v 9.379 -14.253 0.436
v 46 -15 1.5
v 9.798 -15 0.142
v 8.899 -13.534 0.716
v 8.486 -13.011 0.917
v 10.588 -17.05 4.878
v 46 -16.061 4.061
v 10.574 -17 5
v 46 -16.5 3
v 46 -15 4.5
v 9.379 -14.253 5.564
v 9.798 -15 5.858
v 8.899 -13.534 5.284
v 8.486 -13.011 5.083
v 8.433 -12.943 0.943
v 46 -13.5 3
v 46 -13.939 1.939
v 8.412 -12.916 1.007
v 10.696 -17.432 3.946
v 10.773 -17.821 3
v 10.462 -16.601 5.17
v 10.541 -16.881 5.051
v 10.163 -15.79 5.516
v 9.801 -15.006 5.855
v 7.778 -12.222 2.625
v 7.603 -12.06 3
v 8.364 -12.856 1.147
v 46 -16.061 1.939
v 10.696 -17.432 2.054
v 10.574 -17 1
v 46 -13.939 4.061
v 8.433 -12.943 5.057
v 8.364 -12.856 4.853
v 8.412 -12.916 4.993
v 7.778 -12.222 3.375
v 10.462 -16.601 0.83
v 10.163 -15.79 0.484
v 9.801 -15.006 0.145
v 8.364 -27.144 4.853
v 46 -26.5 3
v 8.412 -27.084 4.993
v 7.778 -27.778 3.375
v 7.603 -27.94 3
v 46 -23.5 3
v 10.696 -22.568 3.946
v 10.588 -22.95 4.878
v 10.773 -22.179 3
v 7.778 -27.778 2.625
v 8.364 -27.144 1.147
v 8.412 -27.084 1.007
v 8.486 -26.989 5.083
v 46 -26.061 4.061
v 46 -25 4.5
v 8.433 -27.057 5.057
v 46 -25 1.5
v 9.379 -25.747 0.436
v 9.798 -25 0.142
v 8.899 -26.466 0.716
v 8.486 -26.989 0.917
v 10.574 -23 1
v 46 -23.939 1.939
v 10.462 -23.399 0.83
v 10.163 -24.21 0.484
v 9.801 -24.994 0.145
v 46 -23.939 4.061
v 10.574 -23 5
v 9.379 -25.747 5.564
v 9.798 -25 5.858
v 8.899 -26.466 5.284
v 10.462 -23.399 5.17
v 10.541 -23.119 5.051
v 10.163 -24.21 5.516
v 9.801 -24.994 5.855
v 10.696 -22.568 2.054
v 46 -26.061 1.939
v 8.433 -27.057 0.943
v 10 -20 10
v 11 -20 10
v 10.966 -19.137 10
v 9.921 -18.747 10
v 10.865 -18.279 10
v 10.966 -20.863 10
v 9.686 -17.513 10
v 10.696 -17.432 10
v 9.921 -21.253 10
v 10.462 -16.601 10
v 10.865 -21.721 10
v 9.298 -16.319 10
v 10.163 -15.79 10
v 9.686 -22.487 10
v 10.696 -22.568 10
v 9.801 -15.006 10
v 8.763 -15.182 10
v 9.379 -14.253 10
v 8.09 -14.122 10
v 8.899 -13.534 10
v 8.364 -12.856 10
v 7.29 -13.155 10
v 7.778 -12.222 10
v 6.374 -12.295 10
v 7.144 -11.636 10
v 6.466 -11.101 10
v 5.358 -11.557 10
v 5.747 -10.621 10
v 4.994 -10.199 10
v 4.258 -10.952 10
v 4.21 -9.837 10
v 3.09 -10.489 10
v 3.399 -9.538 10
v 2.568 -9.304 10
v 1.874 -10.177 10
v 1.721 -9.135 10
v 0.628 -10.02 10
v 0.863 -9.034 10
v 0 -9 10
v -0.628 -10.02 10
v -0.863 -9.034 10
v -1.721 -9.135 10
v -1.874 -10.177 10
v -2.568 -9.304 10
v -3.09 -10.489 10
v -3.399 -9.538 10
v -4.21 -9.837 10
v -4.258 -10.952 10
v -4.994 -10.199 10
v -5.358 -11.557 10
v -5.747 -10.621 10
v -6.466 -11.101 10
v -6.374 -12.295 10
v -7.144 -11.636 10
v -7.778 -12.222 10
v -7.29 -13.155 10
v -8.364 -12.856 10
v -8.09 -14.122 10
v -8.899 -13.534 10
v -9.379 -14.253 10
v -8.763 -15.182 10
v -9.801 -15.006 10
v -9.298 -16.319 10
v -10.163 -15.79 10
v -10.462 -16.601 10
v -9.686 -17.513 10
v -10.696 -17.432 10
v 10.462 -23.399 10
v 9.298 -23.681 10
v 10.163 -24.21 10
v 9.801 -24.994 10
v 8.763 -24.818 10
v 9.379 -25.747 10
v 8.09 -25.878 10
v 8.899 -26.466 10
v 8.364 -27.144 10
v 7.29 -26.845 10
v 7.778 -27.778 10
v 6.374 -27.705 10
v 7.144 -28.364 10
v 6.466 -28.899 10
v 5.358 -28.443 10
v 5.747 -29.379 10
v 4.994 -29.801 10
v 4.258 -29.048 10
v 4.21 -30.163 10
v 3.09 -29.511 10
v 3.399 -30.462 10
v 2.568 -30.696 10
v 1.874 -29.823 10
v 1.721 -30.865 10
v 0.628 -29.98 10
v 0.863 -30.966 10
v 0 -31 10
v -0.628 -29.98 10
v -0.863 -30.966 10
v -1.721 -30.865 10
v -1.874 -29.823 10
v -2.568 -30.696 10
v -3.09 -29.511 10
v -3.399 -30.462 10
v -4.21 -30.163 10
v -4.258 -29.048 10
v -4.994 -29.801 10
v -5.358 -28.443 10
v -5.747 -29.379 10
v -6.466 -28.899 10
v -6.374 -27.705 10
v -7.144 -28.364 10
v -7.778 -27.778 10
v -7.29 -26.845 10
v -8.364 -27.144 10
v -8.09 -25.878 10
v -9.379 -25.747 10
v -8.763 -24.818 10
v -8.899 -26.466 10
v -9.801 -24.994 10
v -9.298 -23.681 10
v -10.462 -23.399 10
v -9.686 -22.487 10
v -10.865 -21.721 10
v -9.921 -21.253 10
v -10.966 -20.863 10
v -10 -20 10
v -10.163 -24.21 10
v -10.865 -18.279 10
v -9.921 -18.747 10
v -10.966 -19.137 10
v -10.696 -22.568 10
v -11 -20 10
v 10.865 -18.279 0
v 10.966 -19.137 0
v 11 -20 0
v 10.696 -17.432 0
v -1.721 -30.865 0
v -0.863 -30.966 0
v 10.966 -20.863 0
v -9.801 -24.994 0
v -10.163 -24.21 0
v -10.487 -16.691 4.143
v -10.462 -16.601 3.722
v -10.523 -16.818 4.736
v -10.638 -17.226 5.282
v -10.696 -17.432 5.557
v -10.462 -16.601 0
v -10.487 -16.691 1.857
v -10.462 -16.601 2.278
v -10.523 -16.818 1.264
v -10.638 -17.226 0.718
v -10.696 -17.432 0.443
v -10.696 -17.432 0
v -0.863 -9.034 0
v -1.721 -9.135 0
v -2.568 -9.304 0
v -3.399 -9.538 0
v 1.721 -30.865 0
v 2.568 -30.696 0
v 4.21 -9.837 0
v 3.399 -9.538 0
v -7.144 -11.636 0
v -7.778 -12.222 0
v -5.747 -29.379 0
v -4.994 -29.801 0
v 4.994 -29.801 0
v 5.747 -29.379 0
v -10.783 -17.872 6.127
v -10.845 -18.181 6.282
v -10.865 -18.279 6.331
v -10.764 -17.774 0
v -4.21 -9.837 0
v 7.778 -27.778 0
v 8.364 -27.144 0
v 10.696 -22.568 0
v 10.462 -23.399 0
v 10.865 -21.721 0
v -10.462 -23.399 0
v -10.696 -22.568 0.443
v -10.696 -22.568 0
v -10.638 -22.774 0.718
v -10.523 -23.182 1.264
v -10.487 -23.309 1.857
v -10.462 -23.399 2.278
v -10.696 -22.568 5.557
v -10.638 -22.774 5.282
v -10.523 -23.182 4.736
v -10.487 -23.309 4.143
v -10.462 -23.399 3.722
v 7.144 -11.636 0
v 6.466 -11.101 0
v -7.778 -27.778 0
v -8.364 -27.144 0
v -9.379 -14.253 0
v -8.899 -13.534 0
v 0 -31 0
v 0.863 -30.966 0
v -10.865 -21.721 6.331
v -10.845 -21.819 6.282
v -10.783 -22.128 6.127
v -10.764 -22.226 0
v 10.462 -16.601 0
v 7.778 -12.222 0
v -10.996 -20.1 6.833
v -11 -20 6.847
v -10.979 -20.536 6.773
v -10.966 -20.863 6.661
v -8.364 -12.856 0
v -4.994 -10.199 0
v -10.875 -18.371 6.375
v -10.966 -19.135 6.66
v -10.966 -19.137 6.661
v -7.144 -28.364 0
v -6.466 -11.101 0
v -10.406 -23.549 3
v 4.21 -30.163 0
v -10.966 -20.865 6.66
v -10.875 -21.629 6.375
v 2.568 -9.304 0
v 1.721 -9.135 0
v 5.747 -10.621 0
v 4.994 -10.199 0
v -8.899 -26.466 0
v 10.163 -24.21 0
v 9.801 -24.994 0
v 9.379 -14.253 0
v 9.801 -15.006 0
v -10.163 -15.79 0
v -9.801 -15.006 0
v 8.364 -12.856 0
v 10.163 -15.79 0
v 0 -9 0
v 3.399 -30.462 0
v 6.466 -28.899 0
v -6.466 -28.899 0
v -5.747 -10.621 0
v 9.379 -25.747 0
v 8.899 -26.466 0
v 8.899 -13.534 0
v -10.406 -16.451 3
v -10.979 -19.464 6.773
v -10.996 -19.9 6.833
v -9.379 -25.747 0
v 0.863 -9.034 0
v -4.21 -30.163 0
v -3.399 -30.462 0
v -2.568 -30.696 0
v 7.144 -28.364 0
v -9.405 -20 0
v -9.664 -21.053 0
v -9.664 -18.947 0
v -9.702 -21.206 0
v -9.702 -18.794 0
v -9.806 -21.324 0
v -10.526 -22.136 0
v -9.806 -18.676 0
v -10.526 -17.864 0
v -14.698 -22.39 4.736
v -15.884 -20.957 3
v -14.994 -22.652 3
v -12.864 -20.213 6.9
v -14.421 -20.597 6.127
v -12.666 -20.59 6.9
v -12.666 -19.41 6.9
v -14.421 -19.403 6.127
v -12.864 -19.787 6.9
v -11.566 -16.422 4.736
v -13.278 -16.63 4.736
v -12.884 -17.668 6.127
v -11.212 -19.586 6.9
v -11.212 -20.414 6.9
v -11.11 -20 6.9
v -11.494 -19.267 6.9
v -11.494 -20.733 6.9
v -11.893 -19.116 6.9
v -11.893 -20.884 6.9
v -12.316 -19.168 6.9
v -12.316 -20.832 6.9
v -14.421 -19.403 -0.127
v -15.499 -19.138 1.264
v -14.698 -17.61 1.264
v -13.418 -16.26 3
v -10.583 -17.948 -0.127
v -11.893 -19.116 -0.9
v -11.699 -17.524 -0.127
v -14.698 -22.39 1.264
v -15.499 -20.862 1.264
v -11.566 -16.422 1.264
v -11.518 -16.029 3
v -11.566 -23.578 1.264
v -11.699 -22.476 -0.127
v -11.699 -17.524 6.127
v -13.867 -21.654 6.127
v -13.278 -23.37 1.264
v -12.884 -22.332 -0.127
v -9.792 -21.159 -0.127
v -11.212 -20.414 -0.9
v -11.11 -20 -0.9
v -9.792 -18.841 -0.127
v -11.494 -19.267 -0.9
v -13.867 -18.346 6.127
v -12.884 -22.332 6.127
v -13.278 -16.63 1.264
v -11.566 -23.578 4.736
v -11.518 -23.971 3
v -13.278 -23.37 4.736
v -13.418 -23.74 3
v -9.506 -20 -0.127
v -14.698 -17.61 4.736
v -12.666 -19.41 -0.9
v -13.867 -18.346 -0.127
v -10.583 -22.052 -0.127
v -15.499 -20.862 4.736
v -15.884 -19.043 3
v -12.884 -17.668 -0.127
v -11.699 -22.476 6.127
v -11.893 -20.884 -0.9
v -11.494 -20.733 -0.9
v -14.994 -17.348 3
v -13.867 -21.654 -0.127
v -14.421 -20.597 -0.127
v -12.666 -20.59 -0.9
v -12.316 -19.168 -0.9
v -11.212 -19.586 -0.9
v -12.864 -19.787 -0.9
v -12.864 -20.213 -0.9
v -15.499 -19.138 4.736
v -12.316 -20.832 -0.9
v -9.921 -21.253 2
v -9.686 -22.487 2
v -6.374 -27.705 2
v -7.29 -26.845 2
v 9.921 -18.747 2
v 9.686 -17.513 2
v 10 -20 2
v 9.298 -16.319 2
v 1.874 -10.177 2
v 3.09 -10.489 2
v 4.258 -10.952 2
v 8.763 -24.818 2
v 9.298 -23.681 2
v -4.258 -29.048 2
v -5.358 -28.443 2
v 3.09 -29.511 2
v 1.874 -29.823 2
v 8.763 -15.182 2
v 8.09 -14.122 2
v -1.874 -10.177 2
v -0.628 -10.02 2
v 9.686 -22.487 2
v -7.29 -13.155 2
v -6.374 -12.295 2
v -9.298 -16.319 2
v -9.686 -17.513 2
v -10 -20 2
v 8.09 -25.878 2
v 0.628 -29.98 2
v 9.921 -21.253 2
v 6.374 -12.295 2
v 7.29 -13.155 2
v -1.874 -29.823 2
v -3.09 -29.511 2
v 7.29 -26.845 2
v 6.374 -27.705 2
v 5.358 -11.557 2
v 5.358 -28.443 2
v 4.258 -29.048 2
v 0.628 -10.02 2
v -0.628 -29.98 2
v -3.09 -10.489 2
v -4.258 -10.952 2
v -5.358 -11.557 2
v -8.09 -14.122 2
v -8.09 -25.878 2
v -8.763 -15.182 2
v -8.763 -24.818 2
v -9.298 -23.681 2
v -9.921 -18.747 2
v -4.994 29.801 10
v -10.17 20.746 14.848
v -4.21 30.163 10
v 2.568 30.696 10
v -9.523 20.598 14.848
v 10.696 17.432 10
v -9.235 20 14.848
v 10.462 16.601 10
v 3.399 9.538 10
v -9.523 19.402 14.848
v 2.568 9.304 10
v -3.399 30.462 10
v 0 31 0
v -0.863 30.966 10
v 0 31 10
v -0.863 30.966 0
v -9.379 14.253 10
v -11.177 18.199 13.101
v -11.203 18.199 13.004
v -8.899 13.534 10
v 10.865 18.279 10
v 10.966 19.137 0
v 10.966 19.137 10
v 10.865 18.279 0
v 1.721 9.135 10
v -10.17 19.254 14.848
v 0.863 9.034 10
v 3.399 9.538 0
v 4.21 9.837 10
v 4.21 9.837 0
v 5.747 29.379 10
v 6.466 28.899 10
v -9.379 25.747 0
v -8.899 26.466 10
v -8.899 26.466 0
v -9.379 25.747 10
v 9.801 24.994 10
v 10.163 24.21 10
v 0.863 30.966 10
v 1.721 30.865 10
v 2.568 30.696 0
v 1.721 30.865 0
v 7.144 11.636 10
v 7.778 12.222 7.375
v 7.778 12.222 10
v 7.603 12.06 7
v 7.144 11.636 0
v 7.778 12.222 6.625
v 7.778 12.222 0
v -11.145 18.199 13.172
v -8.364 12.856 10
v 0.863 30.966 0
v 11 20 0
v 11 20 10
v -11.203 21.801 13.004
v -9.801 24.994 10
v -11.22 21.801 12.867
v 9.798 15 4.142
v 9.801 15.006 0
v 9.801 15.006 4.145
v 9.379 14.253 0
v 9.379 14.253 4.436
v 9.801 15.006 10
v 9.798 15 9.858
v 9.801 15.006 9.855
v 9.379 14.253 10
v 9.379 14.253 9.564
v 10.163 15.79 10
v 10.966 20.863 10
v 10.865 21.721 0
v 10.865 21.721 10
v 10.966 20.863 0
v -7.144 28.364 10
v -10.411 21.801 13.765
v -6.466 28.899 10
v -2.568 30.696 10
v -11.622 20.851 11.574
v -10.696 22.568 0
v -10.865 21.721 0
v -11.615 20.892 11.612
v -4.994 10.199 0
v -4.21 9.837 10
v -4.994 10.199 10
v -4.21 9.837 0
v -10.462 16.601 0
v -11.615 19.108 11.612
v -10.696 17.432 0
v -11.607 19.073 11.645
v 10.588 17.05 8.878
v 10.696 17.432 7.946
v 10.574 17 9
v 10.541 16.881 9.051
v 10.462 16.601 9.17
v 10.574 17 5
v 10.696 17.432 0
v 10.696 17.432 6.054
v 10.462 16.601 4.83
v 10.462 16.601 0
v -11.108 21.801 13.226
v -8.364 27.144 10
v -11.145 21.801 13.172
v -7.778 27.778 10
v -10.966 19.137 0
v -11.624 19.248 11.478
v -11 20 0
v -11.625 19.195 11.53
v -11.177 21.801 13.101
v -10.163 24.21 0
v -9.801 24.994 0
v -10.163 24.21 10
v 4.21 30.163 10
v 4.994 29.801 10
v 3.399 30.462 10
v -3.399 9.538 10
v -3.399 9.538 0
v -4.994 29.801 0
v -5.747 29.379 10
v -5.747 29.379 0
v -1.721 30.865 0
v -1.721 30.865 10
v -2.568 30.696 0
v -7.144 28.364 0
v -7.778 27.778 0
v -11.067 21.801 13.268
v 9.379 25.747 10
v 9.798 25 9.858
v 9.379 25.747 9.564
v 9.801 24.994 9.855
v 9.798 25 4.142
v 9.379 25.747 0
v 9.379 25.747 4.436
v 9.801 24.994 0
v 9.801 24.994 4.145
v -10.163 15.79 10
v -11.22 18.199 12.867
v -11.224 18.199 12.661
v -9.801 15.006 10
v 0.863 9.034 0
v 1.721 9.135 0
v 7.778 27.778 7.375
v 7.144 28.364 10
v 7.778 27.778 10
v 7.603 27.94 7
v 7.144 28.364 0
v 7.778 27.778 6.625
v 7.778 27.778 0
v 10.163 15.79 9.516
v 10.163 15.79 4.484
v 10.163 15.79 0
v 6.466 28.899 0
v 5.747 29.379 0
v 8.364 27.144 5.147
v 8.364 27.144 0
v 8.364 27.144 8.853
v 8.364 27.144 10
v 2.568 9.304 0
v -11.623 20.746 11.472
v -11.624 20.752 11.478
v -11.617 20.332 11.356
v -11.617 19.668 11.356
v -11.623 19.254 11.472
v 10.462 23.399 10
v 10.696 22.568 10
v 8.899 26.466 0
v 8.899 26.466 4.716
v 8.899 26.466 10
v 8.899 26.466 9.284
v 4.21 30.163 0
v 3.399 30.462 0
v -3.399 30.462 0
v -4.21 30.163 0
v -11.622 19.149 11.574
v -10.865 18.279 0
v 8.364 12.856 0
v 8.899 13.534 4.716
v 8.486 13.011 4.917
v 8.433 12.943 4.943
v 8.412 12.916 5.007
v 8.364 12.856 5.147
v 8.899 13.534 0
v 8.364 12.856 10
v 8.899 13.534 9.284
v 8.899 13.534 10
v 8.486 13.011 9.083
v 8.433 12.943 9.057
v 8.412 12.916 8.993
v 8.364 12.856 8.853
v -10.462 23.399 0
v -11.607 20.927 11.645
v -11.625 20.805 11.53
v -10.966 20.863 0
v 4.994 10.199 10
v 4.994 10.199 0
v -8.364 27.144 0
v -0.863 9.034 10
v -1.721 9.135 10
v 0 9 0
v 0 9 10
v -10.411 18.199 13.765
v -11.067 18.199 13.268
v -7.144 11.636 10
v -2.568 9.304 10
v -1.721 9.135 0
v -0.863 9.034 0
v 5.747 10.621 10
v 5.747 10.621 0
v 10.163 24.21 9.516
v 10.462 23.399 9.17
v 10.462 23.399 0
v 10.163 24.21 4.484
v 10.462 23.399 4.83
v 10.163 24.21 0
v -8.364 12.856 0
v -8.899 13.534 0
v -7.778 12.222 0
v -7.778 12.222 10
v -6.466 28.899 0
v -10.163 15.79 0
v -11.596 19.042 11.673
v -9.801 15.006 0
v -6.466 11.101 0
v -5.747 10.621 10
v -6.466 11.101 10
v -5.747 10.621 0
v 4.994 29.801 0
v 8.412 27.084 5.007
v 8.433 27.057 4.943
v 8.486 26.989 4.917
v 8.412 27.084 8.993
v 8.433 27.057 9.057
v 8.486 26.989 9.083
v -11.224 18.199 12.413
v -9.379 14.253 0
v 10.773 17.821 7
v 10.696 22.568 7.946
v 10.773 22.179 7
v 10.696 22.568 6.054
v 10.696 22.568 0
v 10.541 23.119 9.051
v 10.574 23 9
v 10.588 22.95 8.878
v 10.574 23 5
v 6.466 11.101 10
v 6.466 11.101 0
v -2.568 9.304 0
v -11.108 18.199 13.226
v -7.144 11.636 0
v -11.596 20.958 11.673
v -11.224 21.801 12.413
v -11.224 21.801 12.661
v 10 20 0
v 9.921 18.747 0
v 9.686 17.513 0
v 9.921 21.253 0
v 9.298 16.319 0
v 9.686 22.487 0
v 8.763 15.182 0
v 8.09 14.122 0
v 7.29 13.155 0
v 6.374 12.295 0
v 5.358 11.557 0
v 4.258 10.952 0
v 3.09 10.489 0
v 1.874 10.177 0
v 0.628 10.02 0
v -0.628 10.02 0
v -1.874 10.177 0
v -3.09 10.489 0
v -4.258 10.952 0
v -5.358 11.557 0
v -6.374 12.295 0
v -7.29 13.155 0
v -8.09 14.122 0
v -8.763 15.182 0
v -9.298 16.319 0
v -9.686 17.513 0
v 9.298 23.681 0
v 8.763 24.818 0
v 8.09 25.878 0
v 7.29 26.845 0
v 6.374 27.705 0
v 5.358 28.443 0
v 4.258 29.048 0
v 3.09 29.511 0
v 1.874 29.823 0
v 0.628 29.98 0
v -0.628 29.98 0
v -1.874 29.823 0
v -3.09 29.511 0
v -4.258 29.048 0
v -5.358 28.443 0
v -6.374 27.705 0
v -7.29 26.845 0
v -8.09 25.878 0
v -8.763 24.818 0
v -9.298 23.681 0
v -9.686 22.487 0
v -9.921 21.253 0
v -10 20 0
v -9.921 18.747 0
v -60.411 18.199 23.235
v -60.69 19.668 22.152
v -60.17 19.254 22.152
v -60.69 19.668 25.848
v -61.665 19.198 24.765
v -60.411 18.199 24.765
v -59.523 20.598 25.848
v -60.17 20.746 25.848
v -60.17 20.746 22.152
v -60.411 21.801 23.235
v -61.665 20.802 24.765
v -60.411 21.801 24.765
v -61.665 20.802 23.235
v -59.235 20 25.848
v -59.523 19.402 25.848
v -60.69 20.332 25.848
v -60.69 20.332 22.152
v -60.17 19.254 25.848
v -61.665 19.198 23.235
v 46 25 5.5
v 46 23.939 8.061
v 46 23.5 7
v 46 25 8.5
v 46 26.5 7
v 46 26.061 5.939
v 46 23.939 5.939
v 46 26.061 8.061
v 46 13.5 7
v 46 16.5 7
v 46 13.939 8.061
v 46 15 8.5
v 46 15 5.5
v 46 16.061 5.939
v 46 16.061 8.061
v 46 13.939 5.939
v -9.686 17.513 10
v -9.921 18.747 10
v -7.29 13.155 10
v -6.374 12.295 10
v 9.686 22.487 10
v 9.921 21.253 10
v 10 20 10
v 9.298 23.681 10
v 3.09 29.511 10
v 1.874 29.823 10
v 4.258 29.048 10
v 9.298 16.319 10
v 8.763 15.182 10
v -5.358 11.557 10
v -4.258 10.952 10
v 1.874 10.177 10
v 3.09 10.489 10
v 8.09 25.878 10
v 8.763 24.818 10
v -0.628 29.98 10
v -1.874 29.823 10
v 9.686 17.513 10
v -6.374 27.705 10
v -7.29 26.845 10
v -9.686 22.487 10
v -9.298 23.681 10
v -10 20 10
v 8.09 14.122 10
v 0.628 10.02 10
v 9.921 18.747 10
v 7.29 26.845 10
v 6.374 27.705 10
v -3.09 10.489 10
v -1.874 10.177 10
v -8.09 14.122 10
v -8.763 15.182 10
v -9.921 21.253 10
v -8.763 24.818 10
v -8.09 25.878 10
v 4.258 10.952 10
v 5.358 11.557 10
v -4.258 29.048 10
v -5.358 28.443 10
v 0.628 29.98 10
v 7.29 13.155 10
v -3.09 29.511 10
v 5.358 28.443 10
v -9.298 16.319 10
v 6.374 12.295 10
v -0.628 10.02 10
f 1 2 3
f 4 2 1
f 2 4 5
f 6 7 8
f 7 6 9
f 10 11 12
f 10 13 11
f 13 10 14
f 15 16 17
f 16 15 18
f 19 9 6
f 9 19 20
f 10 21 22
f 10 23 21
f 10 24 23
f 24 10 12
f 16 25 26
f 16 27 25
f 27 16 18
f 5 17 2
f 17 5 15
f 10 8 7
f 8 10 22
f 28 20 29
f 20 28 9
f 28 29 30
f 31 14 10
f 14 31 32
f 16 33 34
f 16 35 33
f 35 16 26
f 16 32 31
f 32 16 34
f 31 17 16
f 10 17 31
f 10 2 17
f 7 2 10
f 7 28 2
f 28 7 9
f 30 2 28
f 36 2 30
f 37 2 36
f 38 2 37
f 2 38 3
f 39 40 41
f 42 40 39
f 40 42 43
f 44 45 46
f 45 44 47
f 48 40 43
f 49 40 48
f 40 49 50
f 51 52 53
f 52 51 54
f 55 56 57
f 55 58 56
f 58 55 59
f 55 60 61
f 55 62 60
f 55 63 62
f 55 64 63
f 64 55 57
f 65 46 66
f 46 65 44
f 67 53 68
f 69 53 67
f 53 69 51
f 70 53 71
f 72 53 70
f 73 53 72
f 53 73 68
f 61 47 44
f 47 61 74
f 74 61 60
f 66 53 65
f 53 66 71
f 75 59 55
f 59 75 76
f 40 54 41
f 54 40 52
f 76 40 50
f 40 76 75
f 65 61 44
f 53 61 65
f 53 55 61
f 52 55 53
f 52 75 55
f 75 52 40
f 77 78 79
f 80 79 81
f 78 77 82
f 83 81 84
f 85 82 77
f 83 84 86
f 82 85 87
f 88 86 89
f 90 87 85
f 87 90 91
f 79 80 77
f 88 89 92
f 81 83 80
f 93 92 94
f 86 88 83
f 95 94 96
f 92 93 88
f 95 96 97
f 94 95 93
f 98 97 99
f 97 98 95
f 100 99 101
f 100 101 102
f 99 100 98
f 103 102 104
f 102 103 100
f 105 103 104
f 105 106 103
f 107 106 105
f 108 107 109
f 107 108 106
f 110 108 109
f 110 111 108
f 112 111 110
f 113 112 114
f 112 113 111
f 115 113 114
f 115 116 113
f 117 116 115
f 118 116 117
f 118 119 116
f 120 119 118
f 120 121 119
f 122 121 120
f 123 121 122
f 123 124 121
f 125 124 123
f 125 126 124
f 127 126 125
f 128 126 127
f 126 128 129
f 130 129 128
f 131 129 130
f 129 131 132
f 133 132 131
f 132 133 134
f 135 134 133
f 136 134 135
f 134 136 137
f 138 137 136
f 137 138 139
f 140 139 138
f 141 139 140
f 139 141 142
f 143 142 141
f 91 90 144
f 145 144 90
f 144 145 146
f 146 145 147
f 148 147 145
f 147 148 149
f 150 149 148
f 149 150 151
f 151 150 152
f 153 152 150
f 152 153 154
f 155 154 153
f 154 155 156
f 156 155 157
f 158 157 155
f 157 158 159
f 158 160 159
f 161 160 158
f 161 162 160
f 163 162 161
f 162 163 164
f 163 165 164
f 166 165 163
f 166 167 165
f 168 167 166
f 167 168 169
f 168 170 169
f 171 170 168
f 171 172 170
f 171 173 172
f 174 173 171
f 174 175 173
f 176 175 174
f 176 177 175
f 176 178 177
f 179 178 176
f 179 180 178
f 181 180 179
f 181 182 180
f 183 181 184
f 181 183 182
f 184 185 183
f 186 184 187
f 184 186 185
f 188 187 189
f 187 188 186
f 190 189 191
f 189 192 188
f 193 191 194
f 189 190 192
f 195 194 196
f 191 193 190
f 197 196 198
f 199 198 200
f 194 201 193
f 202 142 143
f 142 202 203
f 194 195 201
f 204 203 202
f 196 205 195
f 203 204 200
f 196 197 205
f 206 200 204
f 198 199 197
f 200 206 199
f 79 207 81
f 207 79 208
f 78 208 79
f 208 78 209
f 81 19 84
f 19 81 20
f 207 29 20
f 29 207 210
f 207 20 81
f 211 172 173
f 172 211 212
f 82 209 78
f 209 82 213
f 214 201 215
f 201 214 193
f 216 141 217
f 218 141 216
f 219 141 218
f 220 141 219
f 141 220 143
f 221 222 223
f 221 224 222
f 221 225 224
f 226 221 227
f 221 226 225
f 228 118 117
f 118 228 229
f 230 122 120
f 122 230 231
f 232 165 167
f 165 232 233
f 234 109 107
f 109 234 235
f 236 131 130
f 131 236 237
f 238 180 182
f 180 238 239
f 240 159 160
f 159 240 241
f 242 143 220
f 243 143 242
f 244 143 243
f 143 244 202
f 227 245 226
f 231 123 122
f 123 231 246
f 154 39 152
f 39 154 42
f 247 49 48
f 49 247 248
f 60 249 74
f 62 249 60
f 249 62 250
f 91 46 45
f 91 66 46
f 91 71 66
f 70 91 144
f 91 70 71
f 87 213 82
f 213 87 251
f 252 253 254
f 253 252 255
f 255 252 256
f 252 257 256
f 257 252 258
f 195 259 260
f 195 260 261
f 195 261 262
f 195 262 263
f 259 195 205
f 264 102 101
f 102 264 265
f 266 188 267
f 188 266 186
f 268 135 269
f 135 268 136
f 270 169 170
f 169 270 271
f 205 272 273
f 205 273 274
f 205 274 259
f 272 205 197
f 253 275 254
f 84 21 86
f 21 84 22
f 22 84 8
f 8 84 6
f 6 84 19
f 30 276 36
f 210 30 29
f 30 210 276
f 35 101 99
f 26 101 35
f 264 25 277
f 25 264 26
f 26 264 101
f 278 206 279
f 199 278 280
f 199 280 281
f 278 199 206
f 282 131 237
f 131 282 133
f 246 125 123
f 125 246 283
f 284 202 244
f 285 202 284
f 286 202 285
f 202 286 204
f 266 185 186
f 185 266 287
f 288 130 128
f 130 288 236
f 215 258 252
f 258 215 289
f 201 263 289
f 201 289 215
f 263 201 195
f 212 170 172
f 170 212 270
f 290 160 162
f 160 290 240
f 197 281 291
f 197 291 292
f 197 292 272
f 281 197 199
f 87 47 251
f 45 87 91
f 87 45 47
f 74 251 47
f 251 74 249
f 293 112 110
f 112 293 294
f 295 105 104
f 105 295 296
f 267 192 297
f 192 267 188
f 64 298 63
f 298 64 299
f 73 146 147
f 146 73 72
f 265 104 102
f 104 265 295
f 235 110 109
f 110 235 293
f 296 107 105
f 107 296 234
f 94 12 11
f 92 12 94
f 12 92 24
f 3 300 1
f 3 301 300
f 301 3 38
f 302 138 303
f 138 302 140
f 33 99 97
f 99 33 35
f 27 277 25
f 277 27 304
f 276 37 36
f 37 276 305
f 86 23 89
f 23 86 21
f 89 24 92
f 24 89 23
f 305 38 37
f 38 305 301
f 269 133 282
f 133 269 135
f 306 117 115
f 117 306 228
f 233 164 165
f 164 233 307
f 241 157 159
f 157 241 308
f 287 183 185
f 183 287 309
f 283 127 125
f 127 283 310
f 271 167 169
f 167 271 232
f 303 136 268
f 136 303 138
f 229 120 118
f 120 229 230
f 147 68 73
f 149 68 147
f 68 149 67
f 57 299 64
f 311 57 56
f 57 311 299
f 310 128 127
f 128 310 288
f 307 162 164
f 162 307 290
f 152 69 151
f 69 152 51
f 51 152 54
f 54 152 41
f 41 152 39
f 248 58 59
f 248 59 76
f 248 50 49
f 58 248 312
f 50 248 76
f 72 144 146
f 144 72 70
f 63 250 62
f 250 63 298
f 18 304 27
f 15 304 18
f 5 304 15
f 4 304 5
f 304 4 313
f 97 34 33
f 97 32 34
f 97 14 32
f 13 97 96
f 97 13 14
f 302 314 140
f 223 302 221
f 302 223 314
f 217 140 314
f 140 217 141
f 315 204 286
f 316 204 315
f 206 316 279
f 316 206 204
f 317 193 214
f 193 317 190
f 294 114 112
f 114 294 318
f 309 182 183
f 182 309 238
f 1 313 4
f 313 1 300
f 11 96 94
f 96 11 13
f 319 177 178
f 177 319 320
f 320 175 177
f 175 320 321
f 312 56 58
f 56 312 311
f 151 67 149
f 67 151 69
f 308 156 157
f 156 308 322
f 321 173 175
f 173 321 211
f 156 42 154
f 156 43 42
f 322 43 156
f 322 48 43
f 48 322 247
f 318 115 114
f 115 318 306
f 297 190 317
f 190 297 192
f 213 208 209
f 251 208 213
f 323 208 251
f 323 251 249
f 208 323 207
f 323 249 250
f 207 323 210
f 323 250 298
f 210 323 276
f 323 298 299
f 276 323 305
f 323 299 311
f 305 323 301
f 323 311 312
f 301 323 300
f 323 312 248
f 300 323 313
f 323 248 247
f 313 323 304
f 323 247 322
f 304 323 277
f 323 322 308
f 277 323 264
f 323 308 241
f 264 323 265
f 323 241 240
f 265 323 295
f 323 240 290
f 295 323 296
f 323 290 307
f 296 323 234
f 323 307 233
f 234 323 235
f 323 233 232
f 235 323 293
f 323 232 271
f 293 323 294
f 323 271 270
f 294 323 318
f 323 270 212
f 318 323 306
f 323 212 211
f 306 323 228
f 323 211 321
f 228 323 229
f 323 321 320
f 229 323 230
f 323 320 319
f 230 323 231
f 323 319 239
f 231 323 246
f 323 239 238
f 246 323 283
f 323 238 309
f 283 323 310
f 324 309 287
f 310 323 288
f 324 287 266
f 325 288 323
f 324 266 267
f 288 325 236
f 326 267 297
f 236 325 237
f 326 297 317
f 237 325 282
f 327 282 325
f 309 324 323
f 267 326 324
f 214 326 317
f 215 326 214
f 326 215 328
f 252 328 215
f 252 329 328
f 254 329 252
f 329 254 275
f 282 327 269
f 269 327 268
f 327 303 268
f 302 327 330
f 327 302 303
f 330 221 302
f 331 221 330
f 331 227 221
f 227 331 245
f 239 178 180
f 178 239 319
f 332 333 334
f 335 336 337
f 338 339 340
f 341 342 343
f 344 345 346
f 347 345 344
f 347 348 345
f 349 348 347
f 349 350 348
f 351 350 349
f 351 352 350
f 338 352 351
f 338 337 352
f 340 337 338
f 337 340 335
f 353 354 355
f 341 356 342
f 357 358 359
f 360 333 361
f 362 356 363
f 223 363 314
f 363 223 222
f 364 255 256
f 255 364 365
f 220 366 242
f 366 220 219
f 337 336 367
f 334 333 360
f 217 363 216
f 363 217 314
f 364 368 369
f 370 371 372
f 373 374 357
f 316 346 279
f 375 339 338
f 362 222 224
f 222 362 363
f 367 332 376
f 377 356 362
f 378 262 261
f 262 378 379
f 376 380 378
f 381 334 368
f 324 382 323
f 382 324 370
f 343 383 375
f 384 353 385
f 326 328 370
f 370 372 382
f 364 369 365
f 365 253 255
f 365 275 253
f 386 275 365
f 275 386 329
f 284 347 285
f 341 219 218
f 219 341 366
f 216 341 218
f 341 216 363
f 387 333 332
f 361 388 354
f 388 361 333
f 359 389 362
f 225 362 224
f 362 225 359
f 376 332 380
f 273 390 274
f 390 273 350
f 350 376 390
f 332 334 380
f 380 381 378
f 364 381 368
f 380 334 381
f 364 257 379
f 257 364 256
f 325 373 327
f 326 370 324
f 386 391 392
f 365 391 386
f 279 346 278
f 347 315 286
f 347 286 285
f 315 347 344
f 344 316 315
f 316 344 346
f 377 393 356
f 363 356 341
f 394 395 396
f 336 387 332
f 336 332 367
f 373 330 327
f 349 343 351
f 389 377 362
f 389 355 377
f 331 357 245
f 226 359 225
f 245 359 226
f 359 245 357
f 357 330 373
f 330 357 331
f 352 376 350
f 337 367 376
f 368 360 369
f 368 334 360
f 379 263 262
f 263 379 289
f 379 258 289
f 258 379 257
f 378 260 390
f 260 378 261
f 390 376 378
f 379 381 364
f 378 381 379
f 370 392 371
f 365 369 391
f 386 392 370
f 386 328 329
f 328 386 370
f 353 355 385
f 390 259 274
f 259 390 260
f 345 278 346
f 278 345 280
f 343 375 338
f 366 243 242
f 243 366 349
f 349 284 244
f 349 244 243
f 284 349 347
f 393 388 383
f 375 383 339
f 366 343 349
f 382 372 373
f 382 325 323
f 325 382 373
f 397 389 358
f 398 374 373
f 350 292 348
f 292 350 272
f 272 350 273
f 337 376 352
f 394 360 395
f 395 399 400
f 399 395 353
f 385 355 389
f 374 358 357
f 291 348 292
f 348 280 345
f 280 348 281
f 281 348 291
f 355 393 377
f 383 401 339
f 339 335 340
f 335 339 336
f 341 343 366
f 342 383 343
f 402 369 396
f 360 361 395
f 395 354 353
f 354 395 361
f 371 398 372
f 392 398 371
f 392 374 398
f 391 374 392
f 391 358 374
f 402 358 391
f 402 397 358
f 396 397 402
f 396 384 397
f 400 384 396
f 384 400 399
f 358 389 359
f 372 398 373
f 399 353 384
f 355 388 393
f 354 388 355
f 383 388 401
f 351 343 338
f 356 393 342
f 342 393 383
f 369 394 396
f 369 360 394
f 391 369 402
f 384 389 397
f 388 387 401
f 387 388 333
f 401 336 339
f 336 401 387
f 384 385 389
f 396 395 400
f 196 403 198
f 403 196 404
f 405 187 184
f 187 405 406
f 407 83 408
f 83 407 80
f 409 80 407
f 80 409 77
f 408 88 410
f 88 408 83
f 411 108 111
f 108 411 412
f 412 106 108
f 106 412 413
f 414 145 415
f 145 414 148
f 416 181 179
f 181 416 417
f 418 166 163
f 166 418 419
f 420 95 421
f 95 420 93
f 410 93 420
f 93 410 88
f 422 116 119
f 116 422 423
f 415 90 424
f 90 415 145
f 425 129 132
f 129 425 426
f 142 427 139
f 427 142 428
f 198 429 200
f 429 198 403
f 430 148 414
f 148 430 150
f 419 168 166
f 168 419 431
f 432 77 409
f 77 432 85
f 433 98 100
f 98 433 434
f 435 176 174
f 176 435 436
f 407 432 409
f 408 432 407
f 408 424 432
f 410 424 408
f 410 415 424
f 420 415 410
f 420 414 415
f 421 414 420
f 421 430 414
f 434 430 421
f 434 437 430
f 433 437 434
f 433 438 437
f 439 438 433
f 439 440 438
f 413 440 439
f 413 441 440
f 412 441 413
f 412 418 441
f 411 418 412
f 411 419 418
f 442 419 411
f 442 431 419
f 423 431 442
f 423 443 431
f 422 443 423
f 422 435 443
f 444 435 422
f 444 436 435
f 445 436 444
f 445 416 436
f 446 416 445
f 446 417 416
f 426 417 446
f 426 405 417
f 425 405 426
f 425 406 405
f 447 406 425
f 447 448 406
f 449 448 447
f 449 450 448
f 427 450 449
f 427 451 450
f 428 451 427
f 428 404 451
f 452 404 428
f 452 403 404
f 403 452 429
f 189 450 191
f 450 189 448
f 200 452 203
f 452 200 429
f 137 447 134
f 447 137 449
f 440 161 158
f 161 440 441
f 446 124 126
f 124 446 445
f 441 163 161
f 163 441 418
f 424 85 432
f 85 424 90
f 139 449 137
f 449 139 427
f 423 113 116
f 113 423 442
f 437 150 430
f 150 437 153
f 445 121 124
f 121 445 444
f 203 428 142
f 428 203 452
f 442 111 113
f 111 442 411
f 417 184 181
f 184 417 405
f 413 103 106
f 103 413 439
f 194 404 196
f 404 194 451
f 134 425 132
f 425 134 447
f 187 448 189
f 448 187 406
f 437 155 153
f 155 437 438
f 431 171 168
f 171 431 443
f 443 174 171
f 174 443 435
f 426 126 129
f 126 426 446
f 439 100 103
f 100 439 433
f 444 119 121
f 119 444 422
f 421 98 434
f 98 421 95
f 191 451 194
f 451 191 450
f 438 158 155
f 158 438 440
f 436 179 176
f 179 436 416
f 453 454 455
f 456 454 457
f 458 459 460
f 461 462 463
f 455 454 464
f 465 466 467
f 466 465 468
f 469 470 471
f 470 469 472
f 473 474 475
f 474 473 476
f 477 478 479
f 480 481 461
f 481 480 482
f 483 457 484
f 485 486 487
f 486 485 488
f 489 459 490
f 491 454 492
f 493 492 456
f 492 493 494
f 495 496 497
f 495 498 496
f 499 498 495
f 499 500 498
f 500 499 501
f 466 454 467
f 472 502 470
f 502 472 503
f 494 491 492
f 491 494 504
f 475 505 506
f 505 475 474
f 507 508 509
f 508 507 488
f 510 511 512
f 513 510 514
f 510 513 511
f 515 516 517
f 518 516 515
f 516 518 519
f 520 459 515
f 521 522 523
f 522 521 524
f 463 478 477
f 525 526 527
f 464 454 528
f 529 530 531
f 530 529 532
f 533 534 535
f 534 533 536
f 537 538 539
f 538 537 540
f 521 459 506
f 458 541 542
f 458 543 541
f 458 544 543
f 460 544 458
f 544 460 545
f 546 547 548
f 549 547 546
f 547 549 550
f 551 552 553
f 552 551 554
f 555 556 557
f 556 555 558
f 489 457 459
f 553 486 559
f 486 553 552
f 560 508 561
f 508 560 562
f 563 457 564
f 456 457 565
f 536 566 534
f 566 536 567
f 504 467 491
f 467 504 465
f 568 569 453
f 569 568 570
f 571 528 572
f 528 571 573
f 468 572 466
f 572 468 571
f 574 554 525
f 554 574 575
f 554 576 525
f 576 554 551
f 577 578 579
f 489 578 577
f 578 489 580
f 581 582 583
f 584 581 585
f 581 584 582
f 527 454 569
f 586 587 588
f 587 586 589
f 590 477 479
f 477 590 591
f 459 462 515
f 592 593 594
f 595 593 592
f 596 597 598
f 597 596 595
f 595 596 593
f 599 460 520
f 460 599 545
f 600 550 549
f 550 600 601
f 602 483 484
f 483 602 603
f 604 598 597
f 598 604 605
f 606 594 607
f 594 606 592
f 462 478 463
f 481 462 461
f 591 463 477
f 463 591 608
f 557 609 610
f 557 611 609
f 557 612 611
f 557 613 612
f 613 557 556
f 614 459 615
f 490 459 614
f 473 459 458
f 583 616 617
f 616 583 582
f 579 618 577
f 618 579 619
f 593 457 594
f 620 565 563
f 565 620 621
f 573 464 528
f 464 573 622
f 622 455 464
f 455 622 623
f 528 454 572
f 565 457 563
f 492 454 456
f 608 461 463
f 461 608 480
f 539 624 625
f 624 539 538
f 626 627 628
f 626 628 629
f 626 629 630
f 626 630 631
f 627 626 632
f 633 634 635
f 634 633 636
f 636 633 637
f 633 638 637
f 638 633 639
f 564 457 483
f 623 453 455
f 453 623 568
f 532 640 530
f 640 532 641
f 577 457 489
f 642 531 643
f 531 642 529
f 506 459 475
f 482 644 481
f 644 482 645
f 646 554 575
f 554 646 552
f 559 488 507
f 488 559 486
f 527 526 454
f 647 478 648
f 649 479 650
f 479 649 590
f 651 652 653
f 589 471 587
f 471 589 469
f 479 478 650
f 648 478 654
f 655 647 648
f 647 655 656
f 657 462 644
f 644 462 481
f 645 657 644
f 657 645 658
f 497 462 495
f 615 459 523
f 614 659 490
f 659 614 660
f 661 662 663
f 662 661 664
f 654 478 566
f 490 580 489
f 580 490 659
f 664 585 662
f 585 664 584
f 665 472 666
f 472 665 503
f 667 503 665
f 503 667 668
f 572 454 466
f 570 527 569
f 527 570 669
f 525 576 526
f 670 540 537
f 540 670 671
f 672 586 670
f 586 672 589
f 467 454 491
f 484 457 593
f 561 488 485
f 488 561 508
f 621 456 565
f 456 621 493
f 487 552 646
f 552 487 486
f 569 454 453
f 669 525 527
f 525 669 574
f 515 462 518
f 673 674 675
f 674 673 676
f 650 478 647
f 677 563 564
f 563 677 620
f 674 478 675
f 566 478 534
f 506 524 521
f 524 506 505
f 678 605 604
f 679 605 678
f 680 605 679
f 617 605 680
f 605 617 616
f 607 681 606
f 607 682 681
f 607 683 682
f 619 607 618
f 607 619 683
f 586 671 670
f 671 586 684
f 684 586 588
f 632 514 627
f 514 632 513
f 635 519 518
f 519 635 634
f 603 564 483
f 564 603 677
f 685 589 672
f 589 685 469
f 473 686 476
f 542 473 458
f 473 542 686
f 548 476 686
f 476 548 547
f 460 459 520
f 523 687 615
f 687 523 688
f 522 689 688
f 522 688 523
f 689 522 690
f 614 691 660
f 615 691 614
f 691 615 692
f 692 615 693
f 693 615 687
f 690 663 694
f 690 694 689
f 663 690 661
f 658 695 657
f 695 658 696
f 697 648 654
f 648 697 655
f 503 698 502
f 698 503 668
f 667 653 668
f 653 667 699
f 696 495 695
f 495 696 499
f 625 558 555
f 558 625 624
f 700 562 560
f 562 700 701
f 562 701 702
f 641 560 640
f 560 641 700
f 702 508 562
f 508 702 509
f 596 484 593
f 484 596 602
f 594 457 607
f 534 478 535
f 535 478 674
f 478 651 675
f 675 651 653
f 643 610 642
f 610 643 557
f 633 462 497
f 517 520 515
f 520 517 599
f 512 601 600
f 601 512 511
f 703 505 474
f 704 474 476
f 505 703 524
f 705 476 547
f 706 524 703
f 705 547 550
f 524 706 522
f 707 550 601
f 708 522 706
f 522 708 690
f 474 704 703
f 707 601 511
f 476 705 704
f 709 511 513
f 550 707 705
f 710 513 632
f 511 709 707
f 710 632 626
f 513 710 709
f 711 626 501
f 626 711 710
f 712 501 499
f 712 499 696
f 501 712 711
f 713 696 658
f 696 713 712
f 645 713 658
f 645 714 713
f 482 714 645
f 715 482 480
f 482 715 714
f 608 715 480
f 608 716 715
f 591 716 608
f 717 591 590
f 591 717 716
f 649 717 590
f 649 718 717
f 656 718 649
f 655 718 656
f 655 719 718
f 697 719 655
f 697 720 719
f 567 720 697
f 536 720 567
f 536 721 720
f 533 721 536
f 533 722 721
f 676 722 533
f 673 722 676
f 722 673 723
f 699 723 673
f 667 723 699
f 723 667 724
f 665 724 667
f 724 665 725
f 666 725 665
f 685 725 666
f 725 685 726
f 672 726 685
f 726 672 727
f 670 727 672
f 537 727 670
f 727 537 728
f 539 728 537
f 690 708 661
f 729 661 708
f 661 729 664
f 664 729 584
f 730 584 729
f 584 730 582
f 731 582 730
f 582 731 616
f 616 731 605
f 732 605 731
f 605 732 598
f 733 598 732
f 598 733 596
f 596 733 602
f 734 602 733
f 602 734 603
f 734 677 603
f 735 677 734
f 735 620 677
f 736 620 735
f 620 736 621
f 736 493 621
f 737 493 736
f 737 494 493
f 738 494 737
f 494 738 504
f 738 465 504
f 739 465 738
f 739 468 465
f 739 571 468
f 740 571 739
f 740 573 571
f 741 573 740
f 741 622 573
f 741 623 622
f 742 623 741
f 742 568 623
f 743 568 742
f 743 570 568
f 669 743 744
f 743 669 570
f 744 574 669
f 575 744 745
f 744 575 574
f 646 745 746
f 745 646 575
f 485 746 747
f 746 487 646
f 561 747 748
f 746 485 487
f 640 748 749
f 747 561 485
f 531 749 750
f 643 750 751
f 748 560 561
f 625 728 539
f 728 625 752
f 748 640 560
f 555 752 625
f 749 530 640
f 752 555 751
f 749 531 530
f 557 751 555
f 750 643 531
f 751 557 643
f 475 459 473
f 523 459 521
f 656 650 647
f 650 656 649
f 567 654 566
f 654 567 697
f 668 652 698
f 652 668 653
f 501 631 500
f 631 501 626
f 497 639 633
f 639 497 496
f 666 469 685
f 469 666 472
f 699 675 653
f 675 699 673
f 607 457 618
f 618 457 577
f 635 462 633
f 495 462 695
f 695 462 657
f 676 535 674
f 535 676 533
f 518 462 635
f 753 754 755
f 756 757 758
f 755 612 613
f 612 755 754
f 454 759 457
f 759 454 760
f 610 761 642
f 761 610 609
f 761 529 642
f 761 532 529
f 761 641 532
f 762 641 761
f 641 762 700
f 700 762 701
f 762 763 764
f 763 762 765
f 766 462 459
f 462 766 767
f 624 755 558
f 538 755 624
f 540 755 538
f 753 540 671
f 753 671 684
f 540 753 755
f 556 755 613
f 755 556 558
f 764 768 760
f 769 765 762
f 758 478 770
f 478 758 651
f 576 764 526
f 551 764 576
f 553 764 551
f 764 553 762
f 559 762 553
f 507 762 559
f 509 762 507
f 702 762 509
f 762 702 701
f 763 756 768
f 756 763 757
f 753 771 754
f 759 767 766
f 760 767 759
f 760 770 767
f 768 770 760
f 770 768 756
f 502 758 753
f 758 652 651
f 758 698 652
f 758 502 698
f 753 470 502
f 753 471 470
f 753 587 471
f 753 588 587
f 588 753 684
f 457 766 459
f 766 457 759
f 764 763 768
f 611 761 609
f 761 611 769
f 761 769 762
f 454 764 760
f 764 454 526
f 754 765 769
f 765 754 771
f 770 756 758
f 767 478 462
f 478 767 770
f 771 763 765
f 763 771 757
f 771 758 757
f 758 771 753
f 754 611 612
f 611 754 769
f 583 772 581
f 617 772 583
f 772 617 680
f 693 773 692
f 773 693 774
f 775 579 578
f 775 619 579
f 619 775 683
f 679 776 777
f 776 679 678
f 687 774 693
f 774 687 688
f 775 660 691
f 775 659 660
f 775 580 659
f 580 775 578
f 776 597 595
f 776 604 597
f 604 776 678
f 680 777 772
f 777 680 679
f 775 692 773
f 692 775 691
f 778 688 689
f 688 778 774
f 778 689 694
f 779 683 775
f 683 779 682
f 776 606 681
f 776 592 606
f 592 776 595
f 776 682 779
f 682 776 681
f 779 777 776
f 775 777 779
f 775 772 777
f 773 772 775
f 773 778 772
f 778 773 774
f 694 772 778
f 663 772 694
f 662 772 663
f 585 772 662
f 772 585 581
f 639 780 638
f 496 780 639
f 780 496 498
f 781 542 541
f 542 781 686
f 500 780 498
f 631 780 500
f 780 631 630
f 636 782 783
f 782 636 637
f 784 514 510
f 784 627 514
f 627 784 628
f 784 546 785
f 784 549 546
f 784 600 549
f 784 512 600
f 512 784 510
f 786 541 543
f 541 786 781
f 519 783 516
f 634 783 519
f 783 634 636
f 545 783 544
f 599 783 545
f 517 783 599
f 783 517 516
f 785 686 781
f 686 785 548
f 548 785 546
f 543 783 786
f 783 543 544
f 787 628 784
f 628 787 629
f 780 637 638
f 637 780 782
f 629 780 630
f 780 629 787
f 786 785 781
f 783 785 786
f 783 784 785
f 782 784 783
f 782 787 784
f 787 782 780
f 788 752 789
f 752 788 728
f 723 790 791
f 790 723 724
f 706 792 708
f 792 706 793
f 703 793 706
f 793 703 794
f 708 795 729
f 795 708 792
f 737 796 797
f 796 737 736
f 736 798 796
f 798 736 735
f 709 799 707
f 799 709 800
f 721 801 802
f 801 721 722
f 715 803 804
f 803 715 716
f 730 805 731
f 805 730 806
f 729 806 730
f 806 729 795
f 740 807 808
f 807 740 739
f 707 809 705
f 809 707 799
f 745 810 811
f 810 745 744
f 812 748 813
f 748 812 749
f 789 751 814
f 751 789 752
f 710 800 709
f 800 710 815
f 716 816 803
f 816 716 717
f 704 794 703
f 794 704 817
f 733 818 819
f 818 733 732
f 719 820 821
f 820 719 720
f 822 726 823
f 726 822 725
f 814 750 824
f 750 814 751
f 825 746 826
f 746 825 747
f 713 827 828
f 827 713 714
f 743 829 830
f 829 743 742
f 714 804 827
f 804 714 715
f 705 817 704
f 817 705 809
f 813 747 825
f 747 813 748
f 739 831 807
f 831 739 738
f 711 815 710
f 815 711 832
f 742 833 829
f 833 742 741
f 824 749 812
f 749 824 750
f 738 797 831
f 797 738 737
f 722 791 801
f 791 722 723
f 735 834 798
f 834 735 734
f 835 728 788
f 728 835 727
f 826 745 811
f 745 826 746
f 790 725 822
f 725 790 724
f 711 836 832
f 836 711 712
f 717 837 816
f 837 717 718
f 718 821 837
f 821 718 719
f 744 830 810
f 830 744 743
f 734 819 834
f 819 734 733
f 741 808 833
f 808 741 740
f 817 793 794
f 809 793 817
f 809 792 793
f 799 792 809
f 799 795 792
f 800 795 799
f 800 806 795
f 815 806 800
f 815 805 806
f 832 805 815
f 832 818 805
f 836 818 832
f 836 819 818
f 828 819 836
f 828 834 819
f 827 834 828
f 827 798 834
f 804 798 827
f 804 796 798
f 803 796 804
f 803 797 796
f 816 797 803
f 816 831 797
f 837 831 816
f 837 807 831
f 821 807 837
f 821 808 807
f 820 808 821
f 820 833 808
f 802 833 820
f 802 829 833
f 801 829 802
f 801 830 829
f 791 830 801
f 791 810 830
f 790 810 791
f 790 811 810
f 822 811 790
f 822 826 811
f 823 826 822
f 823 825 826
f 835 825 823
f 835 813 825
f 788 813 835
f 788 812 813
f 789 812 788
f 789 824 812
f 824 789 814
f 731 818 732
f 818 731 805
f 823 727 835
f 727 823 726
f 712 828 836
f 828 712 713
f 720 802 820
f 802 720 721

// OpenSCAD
 
corkRadiusFront=10;
corkRadiusBack=10;
mouthLen = 16;
legHeight=40;
cylinderHeight=10;



module body(corkRadius) {
     cylinder(h=cylinderHeight, r=corkRadius+1, center=false,$fn=80);
}

module bodyHole(corkRadius) {
    cylinder(h=cylinderHeight, r=corkRadius,$fn=50);
}
 
module legs(corkRadius) {
    translate([corkRadius-4,5,3]) rotate([0,90,0]) 
        cylinder(legHeight,3,1.5,$fn=8);
    translate([corkRadius-4,-5,3]) rotate([0,90,0]) 
        cylinder(legHeight,3,1.5,$fn=8); 
}
 
module back() {
     difference() {
        union() {
            body(corkRadiusBack);
            legs(corkRadiusBack);
            translate([-(corkRadiusBack+2),0,3]) 
                sphere(r=4);
        }
        translate([0,0,2]) bodyHole(corkRadiusBack);
     }
 }
 

module frontSolid() {
    union() {
            hull() {
                body(corkRadiusFront);
                translate([-10,0,13]) 
                    sphere(2);
            }
            hull() {
                translate([-10,0,13]) 
                    sphere(2);
            
                translate([-60,0,24]) 
                    sphere(2);            
            }  
    }
    translate([0,0,cylinderHeight-6]) 
        legs(corkRadiusFront);
}

module front() {
     difference() {
        frontSolid();
        translate([0,0,0])  
           bodyHole(corkRadiusFront);

    }

}

  
 
module printAll() {
    if (corkRadiusBack>0){
        translate([0,-20,0]) back();
    }
    if (corkRadiusFront>0){
        translate([0,20,0]) front();
    }
}



printAll();
